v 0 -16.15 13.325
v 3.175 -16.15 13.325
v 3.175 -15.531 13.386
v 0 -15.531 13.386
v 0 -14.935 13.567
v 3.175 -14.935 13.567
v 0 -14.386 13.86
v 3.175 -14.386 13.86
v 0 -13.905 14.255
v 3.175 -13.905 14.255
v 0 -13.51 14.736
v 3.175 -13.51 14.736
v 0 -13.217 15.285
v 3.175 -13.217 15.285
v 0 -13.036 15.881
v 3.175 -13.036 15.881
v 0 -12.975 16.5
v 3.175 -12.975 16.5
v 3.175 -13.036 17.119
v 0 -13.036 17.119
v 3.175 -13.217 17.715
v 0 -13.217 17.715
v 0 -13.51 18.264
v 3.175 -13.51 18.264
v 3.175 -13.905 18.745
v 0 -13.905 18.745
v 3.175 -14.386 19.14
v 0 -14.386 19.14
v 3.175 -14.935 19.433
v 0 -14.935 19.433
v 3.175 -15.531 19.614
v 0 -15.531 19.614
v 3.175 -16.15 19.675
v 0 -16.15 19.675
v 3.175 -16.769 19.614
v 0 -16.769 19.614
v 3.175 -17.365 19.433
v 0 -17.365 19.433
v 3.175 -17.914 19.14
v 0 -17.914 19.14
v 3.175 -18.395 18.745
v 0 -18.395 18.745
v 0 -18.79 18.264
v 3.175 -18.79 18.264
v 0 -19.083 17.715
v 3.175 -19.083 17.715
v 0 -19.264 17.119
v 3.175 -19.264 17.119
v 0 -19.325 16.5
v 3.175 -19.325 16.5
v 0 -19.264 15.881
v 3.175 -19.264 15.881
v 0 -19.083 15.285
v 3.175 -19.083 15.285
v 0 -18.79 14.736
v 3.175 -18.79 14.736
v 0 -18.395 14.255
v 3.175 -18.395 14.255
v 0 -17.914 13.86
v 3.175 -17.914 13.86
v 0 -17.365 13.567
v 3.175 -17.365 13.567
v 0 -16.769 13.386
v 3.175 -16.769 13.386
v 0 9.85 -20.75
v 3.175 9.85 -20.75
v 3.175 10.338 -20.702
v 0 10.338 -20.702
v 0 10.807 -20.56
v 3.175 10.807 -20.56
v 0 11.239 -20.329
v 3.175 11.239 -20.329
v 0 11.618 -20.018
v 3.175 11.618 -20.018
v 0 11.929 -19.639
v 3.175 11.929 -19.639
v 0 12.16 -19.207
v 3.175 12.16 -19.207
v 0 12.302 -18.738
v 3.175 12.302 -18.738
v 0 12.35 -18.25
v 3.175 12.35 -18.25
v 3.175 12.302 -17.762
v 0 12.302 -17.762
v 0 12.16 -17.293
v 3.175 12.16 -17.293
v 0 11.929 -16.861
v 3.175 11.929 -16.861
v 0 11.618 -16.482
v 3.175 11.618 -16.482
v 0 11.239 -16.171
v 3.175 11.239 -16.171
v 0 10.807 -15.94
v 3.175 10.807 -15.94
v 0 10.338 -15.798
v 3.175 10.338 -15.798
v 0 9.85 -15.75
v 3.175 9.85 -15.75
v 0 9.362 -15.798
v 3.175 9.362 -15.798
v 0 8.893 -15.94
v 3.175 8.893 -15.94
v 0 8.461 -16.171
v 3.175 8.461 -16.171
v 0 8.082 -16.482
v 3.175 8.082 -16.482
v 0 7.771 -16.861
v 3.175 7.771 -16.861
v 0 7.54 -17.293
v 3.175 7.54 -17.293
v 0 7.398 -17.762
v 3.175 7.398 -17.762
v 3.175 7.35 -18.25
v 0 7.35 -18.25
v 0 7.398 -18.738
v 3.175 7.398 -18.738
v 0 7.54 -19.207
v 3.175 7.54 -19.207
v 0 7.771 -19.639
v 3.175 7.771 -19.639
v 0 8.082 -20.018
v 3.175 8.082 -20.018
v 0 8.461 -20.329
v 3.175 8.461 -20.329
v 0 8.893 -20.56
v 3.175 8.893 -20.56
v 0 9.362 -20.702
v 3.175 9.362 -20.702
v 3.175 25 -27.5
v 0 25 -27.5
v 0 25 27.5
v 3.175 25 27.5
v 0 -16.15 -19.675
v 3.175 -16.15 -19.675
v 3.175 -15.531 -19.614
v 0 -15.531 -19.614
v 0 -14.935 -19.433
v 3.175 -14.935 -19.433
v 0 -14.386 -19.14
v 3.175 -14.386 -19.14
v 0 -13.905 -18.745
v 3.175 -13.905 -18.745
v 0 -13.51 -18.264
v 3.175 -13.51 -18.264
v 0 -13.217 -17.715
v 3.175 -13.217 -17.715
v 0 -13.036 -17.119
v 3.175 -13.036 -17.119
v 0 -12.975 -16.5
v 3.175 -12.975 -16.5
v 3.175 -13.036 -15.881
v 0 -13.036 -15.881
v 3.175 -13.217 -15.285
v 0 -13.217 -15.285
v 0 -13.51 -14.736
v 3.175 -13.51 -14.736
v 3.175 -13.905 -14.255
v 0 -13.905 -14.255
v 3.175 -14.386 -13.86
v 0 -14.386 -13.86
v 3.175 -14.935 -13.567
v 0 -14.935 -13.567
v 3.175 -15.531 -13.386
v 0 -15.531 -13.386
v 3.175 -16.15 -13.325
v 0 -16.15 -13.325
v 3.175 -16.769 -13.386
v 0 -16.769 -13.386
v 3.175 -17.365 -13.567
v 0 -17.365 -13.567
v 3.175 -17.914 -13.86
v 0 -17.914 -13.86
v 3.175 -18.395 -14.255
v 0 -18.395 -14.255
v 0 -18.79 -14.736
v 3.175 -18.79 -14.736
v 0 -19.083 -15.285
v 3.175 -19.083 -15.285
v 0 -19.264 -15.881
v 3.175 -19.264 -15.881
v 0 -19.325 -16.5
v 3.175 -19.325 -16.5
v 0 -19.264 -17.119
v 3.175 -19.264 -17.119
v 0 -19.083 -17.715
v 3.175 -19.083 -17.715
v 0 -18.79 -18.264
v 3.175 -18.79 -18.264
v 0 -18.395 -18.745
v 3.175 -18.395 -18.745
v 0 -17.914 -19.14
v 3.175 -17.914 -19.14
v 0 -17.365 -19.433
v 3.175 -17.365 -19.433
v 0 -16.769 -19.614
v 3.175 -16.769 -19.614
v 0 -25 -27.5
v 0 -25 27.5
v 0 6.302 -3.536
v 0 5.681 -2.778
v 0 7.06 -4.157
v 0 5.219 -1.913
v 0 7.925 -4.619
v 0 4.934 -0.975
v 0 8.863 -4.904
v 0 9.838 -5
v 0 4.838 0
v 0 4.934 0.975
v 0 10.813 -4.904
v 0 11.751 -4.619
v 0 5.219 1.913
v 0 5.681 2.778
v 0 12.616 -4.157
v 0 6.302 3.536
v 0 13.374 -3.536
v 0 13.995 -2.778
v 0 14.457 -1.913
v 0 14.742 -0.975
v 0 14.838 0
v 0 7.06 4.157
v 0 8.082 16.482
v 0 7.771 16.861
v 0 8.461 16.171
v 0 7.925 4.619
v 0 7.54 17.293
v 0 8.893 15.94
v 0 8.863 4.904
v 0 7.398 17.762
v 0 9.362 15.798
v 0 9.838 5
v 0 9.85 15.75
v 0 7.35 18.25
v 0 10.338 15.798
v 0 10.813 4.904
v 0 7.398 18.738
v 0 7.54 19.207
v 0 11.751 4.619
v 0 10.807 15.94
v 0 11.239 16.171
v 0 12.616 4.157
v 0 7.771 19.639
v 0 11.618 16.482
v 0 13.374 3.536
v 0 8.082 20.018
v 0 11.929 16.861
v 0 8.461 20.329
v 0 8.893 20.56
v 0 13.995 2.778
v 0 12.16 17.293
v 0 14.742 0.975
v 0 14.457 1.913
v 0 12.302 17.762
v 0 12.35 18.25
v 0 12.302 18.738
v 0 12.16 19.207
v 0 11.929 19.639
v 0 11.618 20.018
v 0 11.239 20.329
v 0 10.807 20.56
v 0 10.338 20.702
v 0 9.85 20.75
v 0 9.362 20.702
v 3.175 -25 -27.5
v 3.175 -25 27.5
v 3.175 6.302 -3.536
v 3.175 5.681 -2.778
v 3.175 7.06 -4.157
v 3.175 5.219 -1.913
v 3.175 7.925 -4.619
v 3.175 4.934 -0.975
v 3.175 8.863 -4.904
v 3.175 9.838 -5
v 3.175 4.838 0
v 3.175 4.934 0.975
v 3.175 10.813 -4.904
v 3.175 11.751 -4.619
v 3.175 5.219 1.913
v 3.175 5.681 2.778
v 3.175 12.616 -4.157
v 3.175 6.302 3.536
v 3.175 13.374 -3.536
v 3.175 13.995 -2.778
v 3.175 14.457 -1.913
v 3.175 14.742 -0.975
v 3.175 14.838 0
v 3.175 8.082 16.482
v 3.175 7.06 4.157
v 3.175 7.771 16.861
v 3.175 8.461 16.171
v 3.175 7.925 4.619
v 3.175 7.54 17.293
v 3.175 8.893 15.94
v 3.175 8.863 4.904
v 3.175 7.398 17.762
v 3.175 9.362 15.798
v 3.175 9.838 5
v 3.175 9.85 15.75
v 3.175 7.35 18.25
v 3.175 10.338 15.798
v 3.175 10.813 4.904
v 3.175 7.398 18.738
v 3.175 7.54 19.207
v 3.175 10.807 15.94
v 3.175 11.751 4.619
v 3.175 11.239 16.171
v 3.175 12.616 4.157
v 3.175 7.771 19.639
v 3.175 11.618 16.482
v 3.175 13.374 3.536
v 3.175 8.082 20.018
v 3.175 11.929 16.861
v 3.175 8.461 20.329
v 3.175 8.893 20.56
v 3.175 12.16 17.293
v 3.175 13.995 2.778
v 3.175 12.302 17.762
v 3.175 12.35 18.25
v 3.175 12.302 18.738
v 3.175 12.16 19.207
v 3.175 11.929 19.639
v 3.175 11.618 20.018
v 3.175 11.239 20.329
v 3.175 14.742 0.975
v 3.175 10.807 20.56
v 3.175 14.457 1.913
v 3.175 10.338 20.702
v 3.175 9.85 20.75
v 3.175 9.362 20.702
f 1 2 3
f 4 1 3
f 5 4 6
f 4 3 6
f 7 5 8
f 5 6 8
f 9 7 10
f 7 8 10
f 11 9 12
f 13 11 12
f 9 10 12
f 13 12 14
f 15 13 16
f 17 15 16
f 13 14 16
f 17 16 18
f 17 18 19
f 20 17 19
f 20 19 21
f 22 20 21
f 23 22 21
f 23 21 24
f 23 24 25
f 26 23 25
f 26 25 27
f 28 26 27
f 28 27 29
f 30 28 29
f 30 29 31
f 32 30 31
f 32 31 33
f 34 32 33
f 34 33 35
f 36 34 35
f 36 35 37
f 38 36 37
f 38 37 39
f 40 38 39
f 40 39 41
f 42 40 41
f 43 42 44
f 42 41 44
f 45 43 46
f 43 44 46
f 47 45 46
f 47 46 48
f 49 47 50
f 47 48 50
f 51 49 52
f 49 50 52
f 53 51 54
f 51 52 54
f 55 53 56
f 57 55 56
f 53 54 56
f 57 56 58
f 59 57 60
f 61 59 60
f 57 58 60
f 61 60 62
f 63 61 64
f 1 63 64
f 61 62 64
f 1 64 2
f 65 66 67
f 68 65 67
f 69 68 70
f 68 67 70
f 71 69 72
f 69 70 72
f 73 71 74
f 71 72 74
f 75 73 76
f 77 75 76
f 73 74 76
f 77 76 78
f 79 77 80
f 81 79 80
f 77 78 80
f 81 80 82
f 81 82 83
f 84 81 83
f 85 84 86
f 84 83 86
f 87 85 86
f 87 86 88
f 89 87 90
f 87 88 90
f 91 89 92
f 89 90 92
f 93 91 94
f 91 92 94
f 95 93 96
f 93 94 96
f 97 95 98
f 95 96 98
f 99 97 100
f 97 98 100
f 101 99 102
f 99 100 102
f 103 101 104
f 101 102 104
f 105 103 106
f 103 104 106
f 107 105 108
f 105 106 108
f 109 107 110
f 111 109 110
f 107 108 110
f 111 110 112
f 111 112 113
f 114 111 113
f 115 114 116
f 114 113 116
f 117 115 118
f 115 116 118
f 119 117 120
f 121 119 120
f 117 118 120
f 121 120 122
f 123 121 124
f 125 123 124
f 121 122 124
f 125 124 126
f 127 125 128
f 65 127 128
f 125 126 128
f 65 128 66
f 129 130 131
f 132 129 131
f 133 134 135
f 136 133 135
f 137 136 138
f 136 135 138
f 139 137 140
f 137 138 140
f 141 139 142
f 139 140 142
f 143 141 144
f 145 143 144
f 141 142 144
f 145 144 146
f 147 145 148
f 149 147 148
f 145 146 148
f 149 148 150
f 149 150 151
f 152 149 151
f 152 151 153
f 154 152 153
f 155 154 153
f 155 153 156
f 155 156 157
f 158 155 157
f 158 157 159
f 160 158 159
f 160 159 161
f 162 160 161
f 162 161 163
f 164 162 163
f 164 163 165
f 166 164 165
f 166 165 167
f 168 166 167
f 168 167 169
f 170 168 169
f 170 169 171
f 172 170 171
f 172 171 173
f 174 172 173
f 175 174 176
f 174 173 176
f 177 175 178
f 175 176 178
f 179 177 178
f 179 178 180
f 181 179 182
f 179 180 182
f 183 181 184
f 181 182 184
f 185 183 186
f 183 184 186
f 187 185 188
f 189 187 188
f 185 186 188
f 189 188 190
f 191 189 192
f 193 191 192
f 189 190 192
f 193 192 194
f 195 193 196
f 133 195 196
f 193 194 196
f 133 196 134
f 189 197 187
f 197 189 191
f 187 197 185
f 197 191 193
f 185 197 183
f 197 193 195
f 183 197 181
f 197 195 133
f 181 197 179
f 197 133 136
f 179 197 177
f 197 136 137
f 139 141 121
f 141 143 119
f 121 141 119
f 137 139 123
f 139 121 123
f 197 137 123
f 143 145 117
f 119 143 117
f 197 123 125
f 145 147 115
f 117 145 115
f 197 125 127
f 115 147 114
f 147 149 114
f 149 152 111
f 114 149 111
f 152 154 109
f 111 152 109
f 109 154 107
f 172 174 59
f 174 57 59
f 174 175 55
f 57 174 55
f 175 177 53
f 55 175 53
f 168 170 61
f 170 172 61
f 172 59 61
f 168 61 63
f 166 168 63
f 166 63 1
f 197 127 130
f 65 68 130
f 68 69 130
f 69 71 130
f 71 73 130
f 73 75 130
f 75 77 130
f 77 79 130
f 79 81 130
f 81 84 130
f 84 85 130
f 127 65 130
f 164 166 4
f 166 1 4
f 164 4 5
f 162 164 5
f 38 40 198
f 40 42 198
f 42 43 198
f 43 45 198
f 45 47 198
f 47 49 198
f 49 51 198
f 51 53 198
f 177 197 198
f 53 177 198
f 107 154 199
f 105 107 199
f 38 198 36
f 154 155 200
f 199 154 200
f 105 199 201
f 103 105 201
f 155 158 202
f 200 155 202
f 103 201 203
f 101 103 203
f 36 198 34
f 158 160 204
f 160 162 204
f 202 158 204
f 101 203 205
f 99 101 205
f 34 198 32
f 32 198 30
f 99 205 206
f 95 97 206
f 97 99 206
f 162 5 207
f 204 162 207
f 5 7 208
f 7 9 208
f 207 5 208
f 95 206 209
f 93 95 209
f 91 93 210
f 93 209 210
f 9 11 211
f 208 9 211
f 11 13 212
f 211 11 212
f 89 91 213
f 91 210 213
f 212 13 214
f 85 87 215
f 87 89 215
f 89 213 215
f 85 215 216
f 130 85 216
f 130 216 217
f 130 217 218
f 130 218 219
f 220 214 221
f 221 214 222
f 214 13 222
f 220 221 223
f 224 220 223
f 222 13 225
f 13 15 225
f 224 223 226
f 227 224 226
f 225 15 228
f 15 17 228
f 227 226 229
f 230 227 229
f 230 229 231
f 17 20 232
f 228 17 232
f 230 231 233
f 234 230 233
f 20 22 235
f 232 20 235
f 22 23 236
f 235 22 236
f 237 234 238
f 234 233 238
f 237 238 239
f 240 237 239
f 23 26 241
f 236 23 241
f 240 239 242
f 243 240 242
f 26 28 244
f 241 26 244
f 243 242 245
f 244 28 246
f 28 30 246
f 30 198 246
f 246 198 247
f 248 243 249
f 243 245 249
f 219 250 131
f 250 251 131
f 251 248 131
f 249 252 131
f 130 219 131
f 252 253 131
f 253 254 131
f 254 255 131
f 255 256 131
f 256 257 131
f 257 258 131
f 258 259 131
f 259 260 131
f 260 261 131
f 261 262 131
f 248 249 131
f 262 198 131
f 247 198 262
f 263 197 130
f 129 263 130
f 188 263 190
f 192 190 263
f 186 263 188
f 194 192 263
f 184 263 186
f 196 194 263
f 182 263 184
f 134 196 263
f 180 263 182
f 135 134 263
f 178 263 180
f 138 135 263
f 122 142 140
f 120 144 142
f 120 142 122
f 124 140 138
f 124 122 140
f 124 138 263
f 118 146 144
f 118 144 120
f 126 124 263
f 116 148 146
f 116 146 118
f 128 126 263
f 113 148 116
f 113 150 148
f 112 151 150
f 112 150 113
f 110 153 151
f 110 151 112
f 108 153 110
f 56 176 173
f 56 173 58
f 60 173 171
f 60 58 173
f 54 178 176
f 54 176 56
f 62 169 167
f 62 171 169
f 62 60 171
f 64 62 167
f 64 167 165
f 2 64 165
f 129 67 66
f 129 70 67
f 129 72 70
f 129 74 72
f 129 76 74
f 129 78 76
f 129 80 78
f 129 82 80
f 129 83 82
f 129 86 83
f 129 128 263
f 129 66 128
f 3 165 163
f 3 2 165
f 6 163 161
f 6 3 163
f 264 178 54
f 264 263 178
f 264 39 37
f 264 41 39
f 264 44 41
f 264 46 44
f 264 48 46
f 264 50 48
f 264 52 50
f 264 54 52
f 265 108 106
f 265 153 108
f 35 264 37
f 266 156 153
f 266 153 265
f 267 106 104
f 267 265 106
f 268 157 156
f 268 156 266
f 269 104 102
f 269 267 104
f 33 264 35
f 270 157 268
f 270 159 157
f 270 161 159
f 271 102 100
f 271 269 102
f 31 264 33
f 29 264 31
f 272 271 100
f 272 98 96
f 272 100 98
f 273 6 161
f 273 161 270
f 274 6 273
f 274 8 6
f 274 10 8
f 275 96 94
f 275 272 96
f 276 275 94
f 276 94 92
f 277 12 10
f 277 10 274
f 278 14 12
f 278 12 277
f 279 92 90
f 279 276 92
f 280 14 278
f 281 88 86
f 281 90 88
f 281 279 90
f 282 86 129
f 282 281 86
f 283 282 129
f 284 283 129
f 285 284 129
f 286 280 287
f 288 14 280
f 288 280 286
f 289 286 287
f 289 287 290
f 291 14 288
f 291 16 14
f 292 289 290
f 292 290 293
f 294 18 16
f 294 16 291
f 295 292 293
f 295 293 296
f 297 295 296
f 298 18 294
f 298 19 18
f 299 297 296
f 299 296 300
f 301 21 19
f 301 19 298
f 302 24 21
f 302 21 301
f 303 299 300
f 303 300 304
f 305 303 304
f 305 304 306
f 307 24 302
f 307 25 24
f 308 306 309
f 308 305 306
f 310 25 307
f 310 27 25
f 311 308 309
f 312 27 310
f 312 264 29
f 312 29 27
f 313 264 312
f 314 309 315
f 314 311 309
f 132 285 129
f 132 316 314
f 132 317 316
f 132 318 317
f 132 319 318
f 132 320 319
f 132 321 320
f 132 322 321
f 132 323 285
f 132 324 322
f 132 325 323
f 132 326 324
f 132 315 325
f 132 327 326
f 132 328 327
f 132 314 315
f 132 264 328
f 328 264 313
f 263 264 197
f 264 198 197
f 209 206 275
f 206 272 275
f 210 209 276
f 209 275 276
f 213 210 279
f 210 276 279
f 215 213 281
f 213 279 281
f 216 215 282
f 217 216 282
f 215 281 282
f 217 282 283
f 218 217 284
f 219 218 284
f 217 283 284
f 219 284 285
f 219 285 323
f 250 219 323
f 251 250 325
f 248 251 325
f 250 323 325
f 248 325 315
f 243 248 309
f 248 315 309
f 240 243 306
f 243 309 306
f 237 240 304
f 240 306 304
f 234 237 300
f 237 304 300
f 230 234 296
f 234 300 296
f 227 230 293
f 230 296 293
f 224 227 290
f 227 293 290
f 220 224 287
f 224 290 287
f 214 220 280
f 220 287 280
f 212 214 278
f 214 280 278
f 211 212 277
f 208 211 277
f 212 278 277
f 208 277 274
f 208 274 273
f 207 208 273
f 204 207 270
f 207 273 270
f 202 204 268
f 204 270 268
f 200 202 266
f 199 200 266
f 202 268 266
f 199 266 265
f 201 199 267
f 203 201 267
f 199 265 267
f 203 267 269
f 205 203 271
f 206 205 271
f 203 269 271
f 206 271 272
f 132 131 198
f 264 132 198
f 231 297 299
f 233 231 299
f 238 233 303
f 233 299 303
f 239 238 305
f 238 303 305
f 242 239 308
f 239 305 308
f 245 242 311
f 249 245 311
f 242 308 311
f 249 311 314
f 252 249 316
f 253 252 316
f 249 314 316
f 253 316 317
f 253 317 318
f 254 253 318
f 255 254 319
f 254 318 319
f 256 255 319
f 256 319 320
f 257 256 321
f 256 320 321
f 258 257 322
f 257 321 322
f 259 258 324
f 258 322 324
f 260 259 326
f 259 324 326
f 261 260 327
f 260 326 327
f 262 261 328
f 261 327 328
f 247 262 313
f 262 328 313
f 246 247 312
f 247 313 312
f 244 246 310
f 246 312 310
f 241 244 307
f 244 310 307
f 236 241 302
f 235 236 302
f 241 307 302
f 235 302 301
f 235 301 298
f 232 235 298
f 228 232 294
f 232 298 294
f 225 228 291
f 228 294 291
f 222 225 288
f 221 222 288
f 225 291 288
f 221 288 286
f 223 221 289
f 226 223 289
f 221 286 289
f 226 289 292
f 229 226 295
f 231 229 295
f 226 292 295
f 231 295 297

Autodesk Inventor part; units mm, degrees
ref_plane "YZ Plane" through (0, 0, 0) normal (1, 0, 0) x (0, 1, 0)
ref_plane "XZ Plane" through (0, 0, 0) normal (0, 1, 0) x (-1, 0, 0)
ref_plane "XY Plane" through (0, 0, 0) normal (0, 0, 1) x (1, 0, 0)
sketch "Sketch1" plane through (0, 0, 0) normal (1, 0, 0) x (0, 1, 0)
  line L0 (25, 27.5) -> (-25, 27.5)
  line L1 (-25, 27.5) -> (-25, -27.5)
  line L2 (-25, -27.5) -> (25, -27.5)
  line L3 (25, -27.5) -> (25, 27.5)
  point P0 (0, 0)
  dimension "d0" = 55
  dimension "d1" = 50
  dimension "d2" = 27.5
  dimension "d3" = 25
extrude "Extrusion1" add sketch "Sketch1" along normal blind 3.175
sketch "Sketch2" plane through (3.175, 0, 0) normal (1, 0, 0) x (0, 0, -1)
  circle A0 centre (-18.25, 9.85) radius 2.5
  circle A1 centre (18.25, 9.85) radius 2.5
  circle A2 centre (-16.5, -16.15) radius 3.175
  circle A3 centre (16.5, -16.15) radius 3.175
  line L0 (27.5, -25) -> (27.5, 25) projected
  line L1 (-27.5, 25) -> (-27.5, -25) projected
  line L2 (-27.5, -25) -> (27.5, -25) projected
  point P0 (0, 0)
  dimension "d6" = 6.35
  dimension "d8" = 11
  dimension "d9" = 11
  dimension "d10" = 6.35
  dimension "d11" = 5
  dimension "d12" = 5
  dimension "d13" = 36.5
  dimension "d14" = 9.25
  dimension "d16" = 8.85
  dimension "d17" = 8.85
  dimension "d22" = 34.85
  dimension "d23" = 34.85
  dimension "d24" = 9.25
extrude "Extrusion2" cut sketch "Sketch2" against normal through all
sketch "Sketch3" plane through (3.175, 0, 0) normal (1, 0, 0) x (0, 0, -1)
  circle A0 centre (0, 9.838) radius 5
  line L0 (27.5, -25) -> (27.5, 25) projected
  line L1 (27.5, 25) -> (-27.5, 25) projected
  point P0 (0, 0)
  dimension "d25" = 10
  dimension "d26" = 27.5
  dimension "d27" = 15.162
extrude "Extrusion3" cut sketch "Sketch3" against normal through all
properties part number "BEARING BRACKET MOUNT"
